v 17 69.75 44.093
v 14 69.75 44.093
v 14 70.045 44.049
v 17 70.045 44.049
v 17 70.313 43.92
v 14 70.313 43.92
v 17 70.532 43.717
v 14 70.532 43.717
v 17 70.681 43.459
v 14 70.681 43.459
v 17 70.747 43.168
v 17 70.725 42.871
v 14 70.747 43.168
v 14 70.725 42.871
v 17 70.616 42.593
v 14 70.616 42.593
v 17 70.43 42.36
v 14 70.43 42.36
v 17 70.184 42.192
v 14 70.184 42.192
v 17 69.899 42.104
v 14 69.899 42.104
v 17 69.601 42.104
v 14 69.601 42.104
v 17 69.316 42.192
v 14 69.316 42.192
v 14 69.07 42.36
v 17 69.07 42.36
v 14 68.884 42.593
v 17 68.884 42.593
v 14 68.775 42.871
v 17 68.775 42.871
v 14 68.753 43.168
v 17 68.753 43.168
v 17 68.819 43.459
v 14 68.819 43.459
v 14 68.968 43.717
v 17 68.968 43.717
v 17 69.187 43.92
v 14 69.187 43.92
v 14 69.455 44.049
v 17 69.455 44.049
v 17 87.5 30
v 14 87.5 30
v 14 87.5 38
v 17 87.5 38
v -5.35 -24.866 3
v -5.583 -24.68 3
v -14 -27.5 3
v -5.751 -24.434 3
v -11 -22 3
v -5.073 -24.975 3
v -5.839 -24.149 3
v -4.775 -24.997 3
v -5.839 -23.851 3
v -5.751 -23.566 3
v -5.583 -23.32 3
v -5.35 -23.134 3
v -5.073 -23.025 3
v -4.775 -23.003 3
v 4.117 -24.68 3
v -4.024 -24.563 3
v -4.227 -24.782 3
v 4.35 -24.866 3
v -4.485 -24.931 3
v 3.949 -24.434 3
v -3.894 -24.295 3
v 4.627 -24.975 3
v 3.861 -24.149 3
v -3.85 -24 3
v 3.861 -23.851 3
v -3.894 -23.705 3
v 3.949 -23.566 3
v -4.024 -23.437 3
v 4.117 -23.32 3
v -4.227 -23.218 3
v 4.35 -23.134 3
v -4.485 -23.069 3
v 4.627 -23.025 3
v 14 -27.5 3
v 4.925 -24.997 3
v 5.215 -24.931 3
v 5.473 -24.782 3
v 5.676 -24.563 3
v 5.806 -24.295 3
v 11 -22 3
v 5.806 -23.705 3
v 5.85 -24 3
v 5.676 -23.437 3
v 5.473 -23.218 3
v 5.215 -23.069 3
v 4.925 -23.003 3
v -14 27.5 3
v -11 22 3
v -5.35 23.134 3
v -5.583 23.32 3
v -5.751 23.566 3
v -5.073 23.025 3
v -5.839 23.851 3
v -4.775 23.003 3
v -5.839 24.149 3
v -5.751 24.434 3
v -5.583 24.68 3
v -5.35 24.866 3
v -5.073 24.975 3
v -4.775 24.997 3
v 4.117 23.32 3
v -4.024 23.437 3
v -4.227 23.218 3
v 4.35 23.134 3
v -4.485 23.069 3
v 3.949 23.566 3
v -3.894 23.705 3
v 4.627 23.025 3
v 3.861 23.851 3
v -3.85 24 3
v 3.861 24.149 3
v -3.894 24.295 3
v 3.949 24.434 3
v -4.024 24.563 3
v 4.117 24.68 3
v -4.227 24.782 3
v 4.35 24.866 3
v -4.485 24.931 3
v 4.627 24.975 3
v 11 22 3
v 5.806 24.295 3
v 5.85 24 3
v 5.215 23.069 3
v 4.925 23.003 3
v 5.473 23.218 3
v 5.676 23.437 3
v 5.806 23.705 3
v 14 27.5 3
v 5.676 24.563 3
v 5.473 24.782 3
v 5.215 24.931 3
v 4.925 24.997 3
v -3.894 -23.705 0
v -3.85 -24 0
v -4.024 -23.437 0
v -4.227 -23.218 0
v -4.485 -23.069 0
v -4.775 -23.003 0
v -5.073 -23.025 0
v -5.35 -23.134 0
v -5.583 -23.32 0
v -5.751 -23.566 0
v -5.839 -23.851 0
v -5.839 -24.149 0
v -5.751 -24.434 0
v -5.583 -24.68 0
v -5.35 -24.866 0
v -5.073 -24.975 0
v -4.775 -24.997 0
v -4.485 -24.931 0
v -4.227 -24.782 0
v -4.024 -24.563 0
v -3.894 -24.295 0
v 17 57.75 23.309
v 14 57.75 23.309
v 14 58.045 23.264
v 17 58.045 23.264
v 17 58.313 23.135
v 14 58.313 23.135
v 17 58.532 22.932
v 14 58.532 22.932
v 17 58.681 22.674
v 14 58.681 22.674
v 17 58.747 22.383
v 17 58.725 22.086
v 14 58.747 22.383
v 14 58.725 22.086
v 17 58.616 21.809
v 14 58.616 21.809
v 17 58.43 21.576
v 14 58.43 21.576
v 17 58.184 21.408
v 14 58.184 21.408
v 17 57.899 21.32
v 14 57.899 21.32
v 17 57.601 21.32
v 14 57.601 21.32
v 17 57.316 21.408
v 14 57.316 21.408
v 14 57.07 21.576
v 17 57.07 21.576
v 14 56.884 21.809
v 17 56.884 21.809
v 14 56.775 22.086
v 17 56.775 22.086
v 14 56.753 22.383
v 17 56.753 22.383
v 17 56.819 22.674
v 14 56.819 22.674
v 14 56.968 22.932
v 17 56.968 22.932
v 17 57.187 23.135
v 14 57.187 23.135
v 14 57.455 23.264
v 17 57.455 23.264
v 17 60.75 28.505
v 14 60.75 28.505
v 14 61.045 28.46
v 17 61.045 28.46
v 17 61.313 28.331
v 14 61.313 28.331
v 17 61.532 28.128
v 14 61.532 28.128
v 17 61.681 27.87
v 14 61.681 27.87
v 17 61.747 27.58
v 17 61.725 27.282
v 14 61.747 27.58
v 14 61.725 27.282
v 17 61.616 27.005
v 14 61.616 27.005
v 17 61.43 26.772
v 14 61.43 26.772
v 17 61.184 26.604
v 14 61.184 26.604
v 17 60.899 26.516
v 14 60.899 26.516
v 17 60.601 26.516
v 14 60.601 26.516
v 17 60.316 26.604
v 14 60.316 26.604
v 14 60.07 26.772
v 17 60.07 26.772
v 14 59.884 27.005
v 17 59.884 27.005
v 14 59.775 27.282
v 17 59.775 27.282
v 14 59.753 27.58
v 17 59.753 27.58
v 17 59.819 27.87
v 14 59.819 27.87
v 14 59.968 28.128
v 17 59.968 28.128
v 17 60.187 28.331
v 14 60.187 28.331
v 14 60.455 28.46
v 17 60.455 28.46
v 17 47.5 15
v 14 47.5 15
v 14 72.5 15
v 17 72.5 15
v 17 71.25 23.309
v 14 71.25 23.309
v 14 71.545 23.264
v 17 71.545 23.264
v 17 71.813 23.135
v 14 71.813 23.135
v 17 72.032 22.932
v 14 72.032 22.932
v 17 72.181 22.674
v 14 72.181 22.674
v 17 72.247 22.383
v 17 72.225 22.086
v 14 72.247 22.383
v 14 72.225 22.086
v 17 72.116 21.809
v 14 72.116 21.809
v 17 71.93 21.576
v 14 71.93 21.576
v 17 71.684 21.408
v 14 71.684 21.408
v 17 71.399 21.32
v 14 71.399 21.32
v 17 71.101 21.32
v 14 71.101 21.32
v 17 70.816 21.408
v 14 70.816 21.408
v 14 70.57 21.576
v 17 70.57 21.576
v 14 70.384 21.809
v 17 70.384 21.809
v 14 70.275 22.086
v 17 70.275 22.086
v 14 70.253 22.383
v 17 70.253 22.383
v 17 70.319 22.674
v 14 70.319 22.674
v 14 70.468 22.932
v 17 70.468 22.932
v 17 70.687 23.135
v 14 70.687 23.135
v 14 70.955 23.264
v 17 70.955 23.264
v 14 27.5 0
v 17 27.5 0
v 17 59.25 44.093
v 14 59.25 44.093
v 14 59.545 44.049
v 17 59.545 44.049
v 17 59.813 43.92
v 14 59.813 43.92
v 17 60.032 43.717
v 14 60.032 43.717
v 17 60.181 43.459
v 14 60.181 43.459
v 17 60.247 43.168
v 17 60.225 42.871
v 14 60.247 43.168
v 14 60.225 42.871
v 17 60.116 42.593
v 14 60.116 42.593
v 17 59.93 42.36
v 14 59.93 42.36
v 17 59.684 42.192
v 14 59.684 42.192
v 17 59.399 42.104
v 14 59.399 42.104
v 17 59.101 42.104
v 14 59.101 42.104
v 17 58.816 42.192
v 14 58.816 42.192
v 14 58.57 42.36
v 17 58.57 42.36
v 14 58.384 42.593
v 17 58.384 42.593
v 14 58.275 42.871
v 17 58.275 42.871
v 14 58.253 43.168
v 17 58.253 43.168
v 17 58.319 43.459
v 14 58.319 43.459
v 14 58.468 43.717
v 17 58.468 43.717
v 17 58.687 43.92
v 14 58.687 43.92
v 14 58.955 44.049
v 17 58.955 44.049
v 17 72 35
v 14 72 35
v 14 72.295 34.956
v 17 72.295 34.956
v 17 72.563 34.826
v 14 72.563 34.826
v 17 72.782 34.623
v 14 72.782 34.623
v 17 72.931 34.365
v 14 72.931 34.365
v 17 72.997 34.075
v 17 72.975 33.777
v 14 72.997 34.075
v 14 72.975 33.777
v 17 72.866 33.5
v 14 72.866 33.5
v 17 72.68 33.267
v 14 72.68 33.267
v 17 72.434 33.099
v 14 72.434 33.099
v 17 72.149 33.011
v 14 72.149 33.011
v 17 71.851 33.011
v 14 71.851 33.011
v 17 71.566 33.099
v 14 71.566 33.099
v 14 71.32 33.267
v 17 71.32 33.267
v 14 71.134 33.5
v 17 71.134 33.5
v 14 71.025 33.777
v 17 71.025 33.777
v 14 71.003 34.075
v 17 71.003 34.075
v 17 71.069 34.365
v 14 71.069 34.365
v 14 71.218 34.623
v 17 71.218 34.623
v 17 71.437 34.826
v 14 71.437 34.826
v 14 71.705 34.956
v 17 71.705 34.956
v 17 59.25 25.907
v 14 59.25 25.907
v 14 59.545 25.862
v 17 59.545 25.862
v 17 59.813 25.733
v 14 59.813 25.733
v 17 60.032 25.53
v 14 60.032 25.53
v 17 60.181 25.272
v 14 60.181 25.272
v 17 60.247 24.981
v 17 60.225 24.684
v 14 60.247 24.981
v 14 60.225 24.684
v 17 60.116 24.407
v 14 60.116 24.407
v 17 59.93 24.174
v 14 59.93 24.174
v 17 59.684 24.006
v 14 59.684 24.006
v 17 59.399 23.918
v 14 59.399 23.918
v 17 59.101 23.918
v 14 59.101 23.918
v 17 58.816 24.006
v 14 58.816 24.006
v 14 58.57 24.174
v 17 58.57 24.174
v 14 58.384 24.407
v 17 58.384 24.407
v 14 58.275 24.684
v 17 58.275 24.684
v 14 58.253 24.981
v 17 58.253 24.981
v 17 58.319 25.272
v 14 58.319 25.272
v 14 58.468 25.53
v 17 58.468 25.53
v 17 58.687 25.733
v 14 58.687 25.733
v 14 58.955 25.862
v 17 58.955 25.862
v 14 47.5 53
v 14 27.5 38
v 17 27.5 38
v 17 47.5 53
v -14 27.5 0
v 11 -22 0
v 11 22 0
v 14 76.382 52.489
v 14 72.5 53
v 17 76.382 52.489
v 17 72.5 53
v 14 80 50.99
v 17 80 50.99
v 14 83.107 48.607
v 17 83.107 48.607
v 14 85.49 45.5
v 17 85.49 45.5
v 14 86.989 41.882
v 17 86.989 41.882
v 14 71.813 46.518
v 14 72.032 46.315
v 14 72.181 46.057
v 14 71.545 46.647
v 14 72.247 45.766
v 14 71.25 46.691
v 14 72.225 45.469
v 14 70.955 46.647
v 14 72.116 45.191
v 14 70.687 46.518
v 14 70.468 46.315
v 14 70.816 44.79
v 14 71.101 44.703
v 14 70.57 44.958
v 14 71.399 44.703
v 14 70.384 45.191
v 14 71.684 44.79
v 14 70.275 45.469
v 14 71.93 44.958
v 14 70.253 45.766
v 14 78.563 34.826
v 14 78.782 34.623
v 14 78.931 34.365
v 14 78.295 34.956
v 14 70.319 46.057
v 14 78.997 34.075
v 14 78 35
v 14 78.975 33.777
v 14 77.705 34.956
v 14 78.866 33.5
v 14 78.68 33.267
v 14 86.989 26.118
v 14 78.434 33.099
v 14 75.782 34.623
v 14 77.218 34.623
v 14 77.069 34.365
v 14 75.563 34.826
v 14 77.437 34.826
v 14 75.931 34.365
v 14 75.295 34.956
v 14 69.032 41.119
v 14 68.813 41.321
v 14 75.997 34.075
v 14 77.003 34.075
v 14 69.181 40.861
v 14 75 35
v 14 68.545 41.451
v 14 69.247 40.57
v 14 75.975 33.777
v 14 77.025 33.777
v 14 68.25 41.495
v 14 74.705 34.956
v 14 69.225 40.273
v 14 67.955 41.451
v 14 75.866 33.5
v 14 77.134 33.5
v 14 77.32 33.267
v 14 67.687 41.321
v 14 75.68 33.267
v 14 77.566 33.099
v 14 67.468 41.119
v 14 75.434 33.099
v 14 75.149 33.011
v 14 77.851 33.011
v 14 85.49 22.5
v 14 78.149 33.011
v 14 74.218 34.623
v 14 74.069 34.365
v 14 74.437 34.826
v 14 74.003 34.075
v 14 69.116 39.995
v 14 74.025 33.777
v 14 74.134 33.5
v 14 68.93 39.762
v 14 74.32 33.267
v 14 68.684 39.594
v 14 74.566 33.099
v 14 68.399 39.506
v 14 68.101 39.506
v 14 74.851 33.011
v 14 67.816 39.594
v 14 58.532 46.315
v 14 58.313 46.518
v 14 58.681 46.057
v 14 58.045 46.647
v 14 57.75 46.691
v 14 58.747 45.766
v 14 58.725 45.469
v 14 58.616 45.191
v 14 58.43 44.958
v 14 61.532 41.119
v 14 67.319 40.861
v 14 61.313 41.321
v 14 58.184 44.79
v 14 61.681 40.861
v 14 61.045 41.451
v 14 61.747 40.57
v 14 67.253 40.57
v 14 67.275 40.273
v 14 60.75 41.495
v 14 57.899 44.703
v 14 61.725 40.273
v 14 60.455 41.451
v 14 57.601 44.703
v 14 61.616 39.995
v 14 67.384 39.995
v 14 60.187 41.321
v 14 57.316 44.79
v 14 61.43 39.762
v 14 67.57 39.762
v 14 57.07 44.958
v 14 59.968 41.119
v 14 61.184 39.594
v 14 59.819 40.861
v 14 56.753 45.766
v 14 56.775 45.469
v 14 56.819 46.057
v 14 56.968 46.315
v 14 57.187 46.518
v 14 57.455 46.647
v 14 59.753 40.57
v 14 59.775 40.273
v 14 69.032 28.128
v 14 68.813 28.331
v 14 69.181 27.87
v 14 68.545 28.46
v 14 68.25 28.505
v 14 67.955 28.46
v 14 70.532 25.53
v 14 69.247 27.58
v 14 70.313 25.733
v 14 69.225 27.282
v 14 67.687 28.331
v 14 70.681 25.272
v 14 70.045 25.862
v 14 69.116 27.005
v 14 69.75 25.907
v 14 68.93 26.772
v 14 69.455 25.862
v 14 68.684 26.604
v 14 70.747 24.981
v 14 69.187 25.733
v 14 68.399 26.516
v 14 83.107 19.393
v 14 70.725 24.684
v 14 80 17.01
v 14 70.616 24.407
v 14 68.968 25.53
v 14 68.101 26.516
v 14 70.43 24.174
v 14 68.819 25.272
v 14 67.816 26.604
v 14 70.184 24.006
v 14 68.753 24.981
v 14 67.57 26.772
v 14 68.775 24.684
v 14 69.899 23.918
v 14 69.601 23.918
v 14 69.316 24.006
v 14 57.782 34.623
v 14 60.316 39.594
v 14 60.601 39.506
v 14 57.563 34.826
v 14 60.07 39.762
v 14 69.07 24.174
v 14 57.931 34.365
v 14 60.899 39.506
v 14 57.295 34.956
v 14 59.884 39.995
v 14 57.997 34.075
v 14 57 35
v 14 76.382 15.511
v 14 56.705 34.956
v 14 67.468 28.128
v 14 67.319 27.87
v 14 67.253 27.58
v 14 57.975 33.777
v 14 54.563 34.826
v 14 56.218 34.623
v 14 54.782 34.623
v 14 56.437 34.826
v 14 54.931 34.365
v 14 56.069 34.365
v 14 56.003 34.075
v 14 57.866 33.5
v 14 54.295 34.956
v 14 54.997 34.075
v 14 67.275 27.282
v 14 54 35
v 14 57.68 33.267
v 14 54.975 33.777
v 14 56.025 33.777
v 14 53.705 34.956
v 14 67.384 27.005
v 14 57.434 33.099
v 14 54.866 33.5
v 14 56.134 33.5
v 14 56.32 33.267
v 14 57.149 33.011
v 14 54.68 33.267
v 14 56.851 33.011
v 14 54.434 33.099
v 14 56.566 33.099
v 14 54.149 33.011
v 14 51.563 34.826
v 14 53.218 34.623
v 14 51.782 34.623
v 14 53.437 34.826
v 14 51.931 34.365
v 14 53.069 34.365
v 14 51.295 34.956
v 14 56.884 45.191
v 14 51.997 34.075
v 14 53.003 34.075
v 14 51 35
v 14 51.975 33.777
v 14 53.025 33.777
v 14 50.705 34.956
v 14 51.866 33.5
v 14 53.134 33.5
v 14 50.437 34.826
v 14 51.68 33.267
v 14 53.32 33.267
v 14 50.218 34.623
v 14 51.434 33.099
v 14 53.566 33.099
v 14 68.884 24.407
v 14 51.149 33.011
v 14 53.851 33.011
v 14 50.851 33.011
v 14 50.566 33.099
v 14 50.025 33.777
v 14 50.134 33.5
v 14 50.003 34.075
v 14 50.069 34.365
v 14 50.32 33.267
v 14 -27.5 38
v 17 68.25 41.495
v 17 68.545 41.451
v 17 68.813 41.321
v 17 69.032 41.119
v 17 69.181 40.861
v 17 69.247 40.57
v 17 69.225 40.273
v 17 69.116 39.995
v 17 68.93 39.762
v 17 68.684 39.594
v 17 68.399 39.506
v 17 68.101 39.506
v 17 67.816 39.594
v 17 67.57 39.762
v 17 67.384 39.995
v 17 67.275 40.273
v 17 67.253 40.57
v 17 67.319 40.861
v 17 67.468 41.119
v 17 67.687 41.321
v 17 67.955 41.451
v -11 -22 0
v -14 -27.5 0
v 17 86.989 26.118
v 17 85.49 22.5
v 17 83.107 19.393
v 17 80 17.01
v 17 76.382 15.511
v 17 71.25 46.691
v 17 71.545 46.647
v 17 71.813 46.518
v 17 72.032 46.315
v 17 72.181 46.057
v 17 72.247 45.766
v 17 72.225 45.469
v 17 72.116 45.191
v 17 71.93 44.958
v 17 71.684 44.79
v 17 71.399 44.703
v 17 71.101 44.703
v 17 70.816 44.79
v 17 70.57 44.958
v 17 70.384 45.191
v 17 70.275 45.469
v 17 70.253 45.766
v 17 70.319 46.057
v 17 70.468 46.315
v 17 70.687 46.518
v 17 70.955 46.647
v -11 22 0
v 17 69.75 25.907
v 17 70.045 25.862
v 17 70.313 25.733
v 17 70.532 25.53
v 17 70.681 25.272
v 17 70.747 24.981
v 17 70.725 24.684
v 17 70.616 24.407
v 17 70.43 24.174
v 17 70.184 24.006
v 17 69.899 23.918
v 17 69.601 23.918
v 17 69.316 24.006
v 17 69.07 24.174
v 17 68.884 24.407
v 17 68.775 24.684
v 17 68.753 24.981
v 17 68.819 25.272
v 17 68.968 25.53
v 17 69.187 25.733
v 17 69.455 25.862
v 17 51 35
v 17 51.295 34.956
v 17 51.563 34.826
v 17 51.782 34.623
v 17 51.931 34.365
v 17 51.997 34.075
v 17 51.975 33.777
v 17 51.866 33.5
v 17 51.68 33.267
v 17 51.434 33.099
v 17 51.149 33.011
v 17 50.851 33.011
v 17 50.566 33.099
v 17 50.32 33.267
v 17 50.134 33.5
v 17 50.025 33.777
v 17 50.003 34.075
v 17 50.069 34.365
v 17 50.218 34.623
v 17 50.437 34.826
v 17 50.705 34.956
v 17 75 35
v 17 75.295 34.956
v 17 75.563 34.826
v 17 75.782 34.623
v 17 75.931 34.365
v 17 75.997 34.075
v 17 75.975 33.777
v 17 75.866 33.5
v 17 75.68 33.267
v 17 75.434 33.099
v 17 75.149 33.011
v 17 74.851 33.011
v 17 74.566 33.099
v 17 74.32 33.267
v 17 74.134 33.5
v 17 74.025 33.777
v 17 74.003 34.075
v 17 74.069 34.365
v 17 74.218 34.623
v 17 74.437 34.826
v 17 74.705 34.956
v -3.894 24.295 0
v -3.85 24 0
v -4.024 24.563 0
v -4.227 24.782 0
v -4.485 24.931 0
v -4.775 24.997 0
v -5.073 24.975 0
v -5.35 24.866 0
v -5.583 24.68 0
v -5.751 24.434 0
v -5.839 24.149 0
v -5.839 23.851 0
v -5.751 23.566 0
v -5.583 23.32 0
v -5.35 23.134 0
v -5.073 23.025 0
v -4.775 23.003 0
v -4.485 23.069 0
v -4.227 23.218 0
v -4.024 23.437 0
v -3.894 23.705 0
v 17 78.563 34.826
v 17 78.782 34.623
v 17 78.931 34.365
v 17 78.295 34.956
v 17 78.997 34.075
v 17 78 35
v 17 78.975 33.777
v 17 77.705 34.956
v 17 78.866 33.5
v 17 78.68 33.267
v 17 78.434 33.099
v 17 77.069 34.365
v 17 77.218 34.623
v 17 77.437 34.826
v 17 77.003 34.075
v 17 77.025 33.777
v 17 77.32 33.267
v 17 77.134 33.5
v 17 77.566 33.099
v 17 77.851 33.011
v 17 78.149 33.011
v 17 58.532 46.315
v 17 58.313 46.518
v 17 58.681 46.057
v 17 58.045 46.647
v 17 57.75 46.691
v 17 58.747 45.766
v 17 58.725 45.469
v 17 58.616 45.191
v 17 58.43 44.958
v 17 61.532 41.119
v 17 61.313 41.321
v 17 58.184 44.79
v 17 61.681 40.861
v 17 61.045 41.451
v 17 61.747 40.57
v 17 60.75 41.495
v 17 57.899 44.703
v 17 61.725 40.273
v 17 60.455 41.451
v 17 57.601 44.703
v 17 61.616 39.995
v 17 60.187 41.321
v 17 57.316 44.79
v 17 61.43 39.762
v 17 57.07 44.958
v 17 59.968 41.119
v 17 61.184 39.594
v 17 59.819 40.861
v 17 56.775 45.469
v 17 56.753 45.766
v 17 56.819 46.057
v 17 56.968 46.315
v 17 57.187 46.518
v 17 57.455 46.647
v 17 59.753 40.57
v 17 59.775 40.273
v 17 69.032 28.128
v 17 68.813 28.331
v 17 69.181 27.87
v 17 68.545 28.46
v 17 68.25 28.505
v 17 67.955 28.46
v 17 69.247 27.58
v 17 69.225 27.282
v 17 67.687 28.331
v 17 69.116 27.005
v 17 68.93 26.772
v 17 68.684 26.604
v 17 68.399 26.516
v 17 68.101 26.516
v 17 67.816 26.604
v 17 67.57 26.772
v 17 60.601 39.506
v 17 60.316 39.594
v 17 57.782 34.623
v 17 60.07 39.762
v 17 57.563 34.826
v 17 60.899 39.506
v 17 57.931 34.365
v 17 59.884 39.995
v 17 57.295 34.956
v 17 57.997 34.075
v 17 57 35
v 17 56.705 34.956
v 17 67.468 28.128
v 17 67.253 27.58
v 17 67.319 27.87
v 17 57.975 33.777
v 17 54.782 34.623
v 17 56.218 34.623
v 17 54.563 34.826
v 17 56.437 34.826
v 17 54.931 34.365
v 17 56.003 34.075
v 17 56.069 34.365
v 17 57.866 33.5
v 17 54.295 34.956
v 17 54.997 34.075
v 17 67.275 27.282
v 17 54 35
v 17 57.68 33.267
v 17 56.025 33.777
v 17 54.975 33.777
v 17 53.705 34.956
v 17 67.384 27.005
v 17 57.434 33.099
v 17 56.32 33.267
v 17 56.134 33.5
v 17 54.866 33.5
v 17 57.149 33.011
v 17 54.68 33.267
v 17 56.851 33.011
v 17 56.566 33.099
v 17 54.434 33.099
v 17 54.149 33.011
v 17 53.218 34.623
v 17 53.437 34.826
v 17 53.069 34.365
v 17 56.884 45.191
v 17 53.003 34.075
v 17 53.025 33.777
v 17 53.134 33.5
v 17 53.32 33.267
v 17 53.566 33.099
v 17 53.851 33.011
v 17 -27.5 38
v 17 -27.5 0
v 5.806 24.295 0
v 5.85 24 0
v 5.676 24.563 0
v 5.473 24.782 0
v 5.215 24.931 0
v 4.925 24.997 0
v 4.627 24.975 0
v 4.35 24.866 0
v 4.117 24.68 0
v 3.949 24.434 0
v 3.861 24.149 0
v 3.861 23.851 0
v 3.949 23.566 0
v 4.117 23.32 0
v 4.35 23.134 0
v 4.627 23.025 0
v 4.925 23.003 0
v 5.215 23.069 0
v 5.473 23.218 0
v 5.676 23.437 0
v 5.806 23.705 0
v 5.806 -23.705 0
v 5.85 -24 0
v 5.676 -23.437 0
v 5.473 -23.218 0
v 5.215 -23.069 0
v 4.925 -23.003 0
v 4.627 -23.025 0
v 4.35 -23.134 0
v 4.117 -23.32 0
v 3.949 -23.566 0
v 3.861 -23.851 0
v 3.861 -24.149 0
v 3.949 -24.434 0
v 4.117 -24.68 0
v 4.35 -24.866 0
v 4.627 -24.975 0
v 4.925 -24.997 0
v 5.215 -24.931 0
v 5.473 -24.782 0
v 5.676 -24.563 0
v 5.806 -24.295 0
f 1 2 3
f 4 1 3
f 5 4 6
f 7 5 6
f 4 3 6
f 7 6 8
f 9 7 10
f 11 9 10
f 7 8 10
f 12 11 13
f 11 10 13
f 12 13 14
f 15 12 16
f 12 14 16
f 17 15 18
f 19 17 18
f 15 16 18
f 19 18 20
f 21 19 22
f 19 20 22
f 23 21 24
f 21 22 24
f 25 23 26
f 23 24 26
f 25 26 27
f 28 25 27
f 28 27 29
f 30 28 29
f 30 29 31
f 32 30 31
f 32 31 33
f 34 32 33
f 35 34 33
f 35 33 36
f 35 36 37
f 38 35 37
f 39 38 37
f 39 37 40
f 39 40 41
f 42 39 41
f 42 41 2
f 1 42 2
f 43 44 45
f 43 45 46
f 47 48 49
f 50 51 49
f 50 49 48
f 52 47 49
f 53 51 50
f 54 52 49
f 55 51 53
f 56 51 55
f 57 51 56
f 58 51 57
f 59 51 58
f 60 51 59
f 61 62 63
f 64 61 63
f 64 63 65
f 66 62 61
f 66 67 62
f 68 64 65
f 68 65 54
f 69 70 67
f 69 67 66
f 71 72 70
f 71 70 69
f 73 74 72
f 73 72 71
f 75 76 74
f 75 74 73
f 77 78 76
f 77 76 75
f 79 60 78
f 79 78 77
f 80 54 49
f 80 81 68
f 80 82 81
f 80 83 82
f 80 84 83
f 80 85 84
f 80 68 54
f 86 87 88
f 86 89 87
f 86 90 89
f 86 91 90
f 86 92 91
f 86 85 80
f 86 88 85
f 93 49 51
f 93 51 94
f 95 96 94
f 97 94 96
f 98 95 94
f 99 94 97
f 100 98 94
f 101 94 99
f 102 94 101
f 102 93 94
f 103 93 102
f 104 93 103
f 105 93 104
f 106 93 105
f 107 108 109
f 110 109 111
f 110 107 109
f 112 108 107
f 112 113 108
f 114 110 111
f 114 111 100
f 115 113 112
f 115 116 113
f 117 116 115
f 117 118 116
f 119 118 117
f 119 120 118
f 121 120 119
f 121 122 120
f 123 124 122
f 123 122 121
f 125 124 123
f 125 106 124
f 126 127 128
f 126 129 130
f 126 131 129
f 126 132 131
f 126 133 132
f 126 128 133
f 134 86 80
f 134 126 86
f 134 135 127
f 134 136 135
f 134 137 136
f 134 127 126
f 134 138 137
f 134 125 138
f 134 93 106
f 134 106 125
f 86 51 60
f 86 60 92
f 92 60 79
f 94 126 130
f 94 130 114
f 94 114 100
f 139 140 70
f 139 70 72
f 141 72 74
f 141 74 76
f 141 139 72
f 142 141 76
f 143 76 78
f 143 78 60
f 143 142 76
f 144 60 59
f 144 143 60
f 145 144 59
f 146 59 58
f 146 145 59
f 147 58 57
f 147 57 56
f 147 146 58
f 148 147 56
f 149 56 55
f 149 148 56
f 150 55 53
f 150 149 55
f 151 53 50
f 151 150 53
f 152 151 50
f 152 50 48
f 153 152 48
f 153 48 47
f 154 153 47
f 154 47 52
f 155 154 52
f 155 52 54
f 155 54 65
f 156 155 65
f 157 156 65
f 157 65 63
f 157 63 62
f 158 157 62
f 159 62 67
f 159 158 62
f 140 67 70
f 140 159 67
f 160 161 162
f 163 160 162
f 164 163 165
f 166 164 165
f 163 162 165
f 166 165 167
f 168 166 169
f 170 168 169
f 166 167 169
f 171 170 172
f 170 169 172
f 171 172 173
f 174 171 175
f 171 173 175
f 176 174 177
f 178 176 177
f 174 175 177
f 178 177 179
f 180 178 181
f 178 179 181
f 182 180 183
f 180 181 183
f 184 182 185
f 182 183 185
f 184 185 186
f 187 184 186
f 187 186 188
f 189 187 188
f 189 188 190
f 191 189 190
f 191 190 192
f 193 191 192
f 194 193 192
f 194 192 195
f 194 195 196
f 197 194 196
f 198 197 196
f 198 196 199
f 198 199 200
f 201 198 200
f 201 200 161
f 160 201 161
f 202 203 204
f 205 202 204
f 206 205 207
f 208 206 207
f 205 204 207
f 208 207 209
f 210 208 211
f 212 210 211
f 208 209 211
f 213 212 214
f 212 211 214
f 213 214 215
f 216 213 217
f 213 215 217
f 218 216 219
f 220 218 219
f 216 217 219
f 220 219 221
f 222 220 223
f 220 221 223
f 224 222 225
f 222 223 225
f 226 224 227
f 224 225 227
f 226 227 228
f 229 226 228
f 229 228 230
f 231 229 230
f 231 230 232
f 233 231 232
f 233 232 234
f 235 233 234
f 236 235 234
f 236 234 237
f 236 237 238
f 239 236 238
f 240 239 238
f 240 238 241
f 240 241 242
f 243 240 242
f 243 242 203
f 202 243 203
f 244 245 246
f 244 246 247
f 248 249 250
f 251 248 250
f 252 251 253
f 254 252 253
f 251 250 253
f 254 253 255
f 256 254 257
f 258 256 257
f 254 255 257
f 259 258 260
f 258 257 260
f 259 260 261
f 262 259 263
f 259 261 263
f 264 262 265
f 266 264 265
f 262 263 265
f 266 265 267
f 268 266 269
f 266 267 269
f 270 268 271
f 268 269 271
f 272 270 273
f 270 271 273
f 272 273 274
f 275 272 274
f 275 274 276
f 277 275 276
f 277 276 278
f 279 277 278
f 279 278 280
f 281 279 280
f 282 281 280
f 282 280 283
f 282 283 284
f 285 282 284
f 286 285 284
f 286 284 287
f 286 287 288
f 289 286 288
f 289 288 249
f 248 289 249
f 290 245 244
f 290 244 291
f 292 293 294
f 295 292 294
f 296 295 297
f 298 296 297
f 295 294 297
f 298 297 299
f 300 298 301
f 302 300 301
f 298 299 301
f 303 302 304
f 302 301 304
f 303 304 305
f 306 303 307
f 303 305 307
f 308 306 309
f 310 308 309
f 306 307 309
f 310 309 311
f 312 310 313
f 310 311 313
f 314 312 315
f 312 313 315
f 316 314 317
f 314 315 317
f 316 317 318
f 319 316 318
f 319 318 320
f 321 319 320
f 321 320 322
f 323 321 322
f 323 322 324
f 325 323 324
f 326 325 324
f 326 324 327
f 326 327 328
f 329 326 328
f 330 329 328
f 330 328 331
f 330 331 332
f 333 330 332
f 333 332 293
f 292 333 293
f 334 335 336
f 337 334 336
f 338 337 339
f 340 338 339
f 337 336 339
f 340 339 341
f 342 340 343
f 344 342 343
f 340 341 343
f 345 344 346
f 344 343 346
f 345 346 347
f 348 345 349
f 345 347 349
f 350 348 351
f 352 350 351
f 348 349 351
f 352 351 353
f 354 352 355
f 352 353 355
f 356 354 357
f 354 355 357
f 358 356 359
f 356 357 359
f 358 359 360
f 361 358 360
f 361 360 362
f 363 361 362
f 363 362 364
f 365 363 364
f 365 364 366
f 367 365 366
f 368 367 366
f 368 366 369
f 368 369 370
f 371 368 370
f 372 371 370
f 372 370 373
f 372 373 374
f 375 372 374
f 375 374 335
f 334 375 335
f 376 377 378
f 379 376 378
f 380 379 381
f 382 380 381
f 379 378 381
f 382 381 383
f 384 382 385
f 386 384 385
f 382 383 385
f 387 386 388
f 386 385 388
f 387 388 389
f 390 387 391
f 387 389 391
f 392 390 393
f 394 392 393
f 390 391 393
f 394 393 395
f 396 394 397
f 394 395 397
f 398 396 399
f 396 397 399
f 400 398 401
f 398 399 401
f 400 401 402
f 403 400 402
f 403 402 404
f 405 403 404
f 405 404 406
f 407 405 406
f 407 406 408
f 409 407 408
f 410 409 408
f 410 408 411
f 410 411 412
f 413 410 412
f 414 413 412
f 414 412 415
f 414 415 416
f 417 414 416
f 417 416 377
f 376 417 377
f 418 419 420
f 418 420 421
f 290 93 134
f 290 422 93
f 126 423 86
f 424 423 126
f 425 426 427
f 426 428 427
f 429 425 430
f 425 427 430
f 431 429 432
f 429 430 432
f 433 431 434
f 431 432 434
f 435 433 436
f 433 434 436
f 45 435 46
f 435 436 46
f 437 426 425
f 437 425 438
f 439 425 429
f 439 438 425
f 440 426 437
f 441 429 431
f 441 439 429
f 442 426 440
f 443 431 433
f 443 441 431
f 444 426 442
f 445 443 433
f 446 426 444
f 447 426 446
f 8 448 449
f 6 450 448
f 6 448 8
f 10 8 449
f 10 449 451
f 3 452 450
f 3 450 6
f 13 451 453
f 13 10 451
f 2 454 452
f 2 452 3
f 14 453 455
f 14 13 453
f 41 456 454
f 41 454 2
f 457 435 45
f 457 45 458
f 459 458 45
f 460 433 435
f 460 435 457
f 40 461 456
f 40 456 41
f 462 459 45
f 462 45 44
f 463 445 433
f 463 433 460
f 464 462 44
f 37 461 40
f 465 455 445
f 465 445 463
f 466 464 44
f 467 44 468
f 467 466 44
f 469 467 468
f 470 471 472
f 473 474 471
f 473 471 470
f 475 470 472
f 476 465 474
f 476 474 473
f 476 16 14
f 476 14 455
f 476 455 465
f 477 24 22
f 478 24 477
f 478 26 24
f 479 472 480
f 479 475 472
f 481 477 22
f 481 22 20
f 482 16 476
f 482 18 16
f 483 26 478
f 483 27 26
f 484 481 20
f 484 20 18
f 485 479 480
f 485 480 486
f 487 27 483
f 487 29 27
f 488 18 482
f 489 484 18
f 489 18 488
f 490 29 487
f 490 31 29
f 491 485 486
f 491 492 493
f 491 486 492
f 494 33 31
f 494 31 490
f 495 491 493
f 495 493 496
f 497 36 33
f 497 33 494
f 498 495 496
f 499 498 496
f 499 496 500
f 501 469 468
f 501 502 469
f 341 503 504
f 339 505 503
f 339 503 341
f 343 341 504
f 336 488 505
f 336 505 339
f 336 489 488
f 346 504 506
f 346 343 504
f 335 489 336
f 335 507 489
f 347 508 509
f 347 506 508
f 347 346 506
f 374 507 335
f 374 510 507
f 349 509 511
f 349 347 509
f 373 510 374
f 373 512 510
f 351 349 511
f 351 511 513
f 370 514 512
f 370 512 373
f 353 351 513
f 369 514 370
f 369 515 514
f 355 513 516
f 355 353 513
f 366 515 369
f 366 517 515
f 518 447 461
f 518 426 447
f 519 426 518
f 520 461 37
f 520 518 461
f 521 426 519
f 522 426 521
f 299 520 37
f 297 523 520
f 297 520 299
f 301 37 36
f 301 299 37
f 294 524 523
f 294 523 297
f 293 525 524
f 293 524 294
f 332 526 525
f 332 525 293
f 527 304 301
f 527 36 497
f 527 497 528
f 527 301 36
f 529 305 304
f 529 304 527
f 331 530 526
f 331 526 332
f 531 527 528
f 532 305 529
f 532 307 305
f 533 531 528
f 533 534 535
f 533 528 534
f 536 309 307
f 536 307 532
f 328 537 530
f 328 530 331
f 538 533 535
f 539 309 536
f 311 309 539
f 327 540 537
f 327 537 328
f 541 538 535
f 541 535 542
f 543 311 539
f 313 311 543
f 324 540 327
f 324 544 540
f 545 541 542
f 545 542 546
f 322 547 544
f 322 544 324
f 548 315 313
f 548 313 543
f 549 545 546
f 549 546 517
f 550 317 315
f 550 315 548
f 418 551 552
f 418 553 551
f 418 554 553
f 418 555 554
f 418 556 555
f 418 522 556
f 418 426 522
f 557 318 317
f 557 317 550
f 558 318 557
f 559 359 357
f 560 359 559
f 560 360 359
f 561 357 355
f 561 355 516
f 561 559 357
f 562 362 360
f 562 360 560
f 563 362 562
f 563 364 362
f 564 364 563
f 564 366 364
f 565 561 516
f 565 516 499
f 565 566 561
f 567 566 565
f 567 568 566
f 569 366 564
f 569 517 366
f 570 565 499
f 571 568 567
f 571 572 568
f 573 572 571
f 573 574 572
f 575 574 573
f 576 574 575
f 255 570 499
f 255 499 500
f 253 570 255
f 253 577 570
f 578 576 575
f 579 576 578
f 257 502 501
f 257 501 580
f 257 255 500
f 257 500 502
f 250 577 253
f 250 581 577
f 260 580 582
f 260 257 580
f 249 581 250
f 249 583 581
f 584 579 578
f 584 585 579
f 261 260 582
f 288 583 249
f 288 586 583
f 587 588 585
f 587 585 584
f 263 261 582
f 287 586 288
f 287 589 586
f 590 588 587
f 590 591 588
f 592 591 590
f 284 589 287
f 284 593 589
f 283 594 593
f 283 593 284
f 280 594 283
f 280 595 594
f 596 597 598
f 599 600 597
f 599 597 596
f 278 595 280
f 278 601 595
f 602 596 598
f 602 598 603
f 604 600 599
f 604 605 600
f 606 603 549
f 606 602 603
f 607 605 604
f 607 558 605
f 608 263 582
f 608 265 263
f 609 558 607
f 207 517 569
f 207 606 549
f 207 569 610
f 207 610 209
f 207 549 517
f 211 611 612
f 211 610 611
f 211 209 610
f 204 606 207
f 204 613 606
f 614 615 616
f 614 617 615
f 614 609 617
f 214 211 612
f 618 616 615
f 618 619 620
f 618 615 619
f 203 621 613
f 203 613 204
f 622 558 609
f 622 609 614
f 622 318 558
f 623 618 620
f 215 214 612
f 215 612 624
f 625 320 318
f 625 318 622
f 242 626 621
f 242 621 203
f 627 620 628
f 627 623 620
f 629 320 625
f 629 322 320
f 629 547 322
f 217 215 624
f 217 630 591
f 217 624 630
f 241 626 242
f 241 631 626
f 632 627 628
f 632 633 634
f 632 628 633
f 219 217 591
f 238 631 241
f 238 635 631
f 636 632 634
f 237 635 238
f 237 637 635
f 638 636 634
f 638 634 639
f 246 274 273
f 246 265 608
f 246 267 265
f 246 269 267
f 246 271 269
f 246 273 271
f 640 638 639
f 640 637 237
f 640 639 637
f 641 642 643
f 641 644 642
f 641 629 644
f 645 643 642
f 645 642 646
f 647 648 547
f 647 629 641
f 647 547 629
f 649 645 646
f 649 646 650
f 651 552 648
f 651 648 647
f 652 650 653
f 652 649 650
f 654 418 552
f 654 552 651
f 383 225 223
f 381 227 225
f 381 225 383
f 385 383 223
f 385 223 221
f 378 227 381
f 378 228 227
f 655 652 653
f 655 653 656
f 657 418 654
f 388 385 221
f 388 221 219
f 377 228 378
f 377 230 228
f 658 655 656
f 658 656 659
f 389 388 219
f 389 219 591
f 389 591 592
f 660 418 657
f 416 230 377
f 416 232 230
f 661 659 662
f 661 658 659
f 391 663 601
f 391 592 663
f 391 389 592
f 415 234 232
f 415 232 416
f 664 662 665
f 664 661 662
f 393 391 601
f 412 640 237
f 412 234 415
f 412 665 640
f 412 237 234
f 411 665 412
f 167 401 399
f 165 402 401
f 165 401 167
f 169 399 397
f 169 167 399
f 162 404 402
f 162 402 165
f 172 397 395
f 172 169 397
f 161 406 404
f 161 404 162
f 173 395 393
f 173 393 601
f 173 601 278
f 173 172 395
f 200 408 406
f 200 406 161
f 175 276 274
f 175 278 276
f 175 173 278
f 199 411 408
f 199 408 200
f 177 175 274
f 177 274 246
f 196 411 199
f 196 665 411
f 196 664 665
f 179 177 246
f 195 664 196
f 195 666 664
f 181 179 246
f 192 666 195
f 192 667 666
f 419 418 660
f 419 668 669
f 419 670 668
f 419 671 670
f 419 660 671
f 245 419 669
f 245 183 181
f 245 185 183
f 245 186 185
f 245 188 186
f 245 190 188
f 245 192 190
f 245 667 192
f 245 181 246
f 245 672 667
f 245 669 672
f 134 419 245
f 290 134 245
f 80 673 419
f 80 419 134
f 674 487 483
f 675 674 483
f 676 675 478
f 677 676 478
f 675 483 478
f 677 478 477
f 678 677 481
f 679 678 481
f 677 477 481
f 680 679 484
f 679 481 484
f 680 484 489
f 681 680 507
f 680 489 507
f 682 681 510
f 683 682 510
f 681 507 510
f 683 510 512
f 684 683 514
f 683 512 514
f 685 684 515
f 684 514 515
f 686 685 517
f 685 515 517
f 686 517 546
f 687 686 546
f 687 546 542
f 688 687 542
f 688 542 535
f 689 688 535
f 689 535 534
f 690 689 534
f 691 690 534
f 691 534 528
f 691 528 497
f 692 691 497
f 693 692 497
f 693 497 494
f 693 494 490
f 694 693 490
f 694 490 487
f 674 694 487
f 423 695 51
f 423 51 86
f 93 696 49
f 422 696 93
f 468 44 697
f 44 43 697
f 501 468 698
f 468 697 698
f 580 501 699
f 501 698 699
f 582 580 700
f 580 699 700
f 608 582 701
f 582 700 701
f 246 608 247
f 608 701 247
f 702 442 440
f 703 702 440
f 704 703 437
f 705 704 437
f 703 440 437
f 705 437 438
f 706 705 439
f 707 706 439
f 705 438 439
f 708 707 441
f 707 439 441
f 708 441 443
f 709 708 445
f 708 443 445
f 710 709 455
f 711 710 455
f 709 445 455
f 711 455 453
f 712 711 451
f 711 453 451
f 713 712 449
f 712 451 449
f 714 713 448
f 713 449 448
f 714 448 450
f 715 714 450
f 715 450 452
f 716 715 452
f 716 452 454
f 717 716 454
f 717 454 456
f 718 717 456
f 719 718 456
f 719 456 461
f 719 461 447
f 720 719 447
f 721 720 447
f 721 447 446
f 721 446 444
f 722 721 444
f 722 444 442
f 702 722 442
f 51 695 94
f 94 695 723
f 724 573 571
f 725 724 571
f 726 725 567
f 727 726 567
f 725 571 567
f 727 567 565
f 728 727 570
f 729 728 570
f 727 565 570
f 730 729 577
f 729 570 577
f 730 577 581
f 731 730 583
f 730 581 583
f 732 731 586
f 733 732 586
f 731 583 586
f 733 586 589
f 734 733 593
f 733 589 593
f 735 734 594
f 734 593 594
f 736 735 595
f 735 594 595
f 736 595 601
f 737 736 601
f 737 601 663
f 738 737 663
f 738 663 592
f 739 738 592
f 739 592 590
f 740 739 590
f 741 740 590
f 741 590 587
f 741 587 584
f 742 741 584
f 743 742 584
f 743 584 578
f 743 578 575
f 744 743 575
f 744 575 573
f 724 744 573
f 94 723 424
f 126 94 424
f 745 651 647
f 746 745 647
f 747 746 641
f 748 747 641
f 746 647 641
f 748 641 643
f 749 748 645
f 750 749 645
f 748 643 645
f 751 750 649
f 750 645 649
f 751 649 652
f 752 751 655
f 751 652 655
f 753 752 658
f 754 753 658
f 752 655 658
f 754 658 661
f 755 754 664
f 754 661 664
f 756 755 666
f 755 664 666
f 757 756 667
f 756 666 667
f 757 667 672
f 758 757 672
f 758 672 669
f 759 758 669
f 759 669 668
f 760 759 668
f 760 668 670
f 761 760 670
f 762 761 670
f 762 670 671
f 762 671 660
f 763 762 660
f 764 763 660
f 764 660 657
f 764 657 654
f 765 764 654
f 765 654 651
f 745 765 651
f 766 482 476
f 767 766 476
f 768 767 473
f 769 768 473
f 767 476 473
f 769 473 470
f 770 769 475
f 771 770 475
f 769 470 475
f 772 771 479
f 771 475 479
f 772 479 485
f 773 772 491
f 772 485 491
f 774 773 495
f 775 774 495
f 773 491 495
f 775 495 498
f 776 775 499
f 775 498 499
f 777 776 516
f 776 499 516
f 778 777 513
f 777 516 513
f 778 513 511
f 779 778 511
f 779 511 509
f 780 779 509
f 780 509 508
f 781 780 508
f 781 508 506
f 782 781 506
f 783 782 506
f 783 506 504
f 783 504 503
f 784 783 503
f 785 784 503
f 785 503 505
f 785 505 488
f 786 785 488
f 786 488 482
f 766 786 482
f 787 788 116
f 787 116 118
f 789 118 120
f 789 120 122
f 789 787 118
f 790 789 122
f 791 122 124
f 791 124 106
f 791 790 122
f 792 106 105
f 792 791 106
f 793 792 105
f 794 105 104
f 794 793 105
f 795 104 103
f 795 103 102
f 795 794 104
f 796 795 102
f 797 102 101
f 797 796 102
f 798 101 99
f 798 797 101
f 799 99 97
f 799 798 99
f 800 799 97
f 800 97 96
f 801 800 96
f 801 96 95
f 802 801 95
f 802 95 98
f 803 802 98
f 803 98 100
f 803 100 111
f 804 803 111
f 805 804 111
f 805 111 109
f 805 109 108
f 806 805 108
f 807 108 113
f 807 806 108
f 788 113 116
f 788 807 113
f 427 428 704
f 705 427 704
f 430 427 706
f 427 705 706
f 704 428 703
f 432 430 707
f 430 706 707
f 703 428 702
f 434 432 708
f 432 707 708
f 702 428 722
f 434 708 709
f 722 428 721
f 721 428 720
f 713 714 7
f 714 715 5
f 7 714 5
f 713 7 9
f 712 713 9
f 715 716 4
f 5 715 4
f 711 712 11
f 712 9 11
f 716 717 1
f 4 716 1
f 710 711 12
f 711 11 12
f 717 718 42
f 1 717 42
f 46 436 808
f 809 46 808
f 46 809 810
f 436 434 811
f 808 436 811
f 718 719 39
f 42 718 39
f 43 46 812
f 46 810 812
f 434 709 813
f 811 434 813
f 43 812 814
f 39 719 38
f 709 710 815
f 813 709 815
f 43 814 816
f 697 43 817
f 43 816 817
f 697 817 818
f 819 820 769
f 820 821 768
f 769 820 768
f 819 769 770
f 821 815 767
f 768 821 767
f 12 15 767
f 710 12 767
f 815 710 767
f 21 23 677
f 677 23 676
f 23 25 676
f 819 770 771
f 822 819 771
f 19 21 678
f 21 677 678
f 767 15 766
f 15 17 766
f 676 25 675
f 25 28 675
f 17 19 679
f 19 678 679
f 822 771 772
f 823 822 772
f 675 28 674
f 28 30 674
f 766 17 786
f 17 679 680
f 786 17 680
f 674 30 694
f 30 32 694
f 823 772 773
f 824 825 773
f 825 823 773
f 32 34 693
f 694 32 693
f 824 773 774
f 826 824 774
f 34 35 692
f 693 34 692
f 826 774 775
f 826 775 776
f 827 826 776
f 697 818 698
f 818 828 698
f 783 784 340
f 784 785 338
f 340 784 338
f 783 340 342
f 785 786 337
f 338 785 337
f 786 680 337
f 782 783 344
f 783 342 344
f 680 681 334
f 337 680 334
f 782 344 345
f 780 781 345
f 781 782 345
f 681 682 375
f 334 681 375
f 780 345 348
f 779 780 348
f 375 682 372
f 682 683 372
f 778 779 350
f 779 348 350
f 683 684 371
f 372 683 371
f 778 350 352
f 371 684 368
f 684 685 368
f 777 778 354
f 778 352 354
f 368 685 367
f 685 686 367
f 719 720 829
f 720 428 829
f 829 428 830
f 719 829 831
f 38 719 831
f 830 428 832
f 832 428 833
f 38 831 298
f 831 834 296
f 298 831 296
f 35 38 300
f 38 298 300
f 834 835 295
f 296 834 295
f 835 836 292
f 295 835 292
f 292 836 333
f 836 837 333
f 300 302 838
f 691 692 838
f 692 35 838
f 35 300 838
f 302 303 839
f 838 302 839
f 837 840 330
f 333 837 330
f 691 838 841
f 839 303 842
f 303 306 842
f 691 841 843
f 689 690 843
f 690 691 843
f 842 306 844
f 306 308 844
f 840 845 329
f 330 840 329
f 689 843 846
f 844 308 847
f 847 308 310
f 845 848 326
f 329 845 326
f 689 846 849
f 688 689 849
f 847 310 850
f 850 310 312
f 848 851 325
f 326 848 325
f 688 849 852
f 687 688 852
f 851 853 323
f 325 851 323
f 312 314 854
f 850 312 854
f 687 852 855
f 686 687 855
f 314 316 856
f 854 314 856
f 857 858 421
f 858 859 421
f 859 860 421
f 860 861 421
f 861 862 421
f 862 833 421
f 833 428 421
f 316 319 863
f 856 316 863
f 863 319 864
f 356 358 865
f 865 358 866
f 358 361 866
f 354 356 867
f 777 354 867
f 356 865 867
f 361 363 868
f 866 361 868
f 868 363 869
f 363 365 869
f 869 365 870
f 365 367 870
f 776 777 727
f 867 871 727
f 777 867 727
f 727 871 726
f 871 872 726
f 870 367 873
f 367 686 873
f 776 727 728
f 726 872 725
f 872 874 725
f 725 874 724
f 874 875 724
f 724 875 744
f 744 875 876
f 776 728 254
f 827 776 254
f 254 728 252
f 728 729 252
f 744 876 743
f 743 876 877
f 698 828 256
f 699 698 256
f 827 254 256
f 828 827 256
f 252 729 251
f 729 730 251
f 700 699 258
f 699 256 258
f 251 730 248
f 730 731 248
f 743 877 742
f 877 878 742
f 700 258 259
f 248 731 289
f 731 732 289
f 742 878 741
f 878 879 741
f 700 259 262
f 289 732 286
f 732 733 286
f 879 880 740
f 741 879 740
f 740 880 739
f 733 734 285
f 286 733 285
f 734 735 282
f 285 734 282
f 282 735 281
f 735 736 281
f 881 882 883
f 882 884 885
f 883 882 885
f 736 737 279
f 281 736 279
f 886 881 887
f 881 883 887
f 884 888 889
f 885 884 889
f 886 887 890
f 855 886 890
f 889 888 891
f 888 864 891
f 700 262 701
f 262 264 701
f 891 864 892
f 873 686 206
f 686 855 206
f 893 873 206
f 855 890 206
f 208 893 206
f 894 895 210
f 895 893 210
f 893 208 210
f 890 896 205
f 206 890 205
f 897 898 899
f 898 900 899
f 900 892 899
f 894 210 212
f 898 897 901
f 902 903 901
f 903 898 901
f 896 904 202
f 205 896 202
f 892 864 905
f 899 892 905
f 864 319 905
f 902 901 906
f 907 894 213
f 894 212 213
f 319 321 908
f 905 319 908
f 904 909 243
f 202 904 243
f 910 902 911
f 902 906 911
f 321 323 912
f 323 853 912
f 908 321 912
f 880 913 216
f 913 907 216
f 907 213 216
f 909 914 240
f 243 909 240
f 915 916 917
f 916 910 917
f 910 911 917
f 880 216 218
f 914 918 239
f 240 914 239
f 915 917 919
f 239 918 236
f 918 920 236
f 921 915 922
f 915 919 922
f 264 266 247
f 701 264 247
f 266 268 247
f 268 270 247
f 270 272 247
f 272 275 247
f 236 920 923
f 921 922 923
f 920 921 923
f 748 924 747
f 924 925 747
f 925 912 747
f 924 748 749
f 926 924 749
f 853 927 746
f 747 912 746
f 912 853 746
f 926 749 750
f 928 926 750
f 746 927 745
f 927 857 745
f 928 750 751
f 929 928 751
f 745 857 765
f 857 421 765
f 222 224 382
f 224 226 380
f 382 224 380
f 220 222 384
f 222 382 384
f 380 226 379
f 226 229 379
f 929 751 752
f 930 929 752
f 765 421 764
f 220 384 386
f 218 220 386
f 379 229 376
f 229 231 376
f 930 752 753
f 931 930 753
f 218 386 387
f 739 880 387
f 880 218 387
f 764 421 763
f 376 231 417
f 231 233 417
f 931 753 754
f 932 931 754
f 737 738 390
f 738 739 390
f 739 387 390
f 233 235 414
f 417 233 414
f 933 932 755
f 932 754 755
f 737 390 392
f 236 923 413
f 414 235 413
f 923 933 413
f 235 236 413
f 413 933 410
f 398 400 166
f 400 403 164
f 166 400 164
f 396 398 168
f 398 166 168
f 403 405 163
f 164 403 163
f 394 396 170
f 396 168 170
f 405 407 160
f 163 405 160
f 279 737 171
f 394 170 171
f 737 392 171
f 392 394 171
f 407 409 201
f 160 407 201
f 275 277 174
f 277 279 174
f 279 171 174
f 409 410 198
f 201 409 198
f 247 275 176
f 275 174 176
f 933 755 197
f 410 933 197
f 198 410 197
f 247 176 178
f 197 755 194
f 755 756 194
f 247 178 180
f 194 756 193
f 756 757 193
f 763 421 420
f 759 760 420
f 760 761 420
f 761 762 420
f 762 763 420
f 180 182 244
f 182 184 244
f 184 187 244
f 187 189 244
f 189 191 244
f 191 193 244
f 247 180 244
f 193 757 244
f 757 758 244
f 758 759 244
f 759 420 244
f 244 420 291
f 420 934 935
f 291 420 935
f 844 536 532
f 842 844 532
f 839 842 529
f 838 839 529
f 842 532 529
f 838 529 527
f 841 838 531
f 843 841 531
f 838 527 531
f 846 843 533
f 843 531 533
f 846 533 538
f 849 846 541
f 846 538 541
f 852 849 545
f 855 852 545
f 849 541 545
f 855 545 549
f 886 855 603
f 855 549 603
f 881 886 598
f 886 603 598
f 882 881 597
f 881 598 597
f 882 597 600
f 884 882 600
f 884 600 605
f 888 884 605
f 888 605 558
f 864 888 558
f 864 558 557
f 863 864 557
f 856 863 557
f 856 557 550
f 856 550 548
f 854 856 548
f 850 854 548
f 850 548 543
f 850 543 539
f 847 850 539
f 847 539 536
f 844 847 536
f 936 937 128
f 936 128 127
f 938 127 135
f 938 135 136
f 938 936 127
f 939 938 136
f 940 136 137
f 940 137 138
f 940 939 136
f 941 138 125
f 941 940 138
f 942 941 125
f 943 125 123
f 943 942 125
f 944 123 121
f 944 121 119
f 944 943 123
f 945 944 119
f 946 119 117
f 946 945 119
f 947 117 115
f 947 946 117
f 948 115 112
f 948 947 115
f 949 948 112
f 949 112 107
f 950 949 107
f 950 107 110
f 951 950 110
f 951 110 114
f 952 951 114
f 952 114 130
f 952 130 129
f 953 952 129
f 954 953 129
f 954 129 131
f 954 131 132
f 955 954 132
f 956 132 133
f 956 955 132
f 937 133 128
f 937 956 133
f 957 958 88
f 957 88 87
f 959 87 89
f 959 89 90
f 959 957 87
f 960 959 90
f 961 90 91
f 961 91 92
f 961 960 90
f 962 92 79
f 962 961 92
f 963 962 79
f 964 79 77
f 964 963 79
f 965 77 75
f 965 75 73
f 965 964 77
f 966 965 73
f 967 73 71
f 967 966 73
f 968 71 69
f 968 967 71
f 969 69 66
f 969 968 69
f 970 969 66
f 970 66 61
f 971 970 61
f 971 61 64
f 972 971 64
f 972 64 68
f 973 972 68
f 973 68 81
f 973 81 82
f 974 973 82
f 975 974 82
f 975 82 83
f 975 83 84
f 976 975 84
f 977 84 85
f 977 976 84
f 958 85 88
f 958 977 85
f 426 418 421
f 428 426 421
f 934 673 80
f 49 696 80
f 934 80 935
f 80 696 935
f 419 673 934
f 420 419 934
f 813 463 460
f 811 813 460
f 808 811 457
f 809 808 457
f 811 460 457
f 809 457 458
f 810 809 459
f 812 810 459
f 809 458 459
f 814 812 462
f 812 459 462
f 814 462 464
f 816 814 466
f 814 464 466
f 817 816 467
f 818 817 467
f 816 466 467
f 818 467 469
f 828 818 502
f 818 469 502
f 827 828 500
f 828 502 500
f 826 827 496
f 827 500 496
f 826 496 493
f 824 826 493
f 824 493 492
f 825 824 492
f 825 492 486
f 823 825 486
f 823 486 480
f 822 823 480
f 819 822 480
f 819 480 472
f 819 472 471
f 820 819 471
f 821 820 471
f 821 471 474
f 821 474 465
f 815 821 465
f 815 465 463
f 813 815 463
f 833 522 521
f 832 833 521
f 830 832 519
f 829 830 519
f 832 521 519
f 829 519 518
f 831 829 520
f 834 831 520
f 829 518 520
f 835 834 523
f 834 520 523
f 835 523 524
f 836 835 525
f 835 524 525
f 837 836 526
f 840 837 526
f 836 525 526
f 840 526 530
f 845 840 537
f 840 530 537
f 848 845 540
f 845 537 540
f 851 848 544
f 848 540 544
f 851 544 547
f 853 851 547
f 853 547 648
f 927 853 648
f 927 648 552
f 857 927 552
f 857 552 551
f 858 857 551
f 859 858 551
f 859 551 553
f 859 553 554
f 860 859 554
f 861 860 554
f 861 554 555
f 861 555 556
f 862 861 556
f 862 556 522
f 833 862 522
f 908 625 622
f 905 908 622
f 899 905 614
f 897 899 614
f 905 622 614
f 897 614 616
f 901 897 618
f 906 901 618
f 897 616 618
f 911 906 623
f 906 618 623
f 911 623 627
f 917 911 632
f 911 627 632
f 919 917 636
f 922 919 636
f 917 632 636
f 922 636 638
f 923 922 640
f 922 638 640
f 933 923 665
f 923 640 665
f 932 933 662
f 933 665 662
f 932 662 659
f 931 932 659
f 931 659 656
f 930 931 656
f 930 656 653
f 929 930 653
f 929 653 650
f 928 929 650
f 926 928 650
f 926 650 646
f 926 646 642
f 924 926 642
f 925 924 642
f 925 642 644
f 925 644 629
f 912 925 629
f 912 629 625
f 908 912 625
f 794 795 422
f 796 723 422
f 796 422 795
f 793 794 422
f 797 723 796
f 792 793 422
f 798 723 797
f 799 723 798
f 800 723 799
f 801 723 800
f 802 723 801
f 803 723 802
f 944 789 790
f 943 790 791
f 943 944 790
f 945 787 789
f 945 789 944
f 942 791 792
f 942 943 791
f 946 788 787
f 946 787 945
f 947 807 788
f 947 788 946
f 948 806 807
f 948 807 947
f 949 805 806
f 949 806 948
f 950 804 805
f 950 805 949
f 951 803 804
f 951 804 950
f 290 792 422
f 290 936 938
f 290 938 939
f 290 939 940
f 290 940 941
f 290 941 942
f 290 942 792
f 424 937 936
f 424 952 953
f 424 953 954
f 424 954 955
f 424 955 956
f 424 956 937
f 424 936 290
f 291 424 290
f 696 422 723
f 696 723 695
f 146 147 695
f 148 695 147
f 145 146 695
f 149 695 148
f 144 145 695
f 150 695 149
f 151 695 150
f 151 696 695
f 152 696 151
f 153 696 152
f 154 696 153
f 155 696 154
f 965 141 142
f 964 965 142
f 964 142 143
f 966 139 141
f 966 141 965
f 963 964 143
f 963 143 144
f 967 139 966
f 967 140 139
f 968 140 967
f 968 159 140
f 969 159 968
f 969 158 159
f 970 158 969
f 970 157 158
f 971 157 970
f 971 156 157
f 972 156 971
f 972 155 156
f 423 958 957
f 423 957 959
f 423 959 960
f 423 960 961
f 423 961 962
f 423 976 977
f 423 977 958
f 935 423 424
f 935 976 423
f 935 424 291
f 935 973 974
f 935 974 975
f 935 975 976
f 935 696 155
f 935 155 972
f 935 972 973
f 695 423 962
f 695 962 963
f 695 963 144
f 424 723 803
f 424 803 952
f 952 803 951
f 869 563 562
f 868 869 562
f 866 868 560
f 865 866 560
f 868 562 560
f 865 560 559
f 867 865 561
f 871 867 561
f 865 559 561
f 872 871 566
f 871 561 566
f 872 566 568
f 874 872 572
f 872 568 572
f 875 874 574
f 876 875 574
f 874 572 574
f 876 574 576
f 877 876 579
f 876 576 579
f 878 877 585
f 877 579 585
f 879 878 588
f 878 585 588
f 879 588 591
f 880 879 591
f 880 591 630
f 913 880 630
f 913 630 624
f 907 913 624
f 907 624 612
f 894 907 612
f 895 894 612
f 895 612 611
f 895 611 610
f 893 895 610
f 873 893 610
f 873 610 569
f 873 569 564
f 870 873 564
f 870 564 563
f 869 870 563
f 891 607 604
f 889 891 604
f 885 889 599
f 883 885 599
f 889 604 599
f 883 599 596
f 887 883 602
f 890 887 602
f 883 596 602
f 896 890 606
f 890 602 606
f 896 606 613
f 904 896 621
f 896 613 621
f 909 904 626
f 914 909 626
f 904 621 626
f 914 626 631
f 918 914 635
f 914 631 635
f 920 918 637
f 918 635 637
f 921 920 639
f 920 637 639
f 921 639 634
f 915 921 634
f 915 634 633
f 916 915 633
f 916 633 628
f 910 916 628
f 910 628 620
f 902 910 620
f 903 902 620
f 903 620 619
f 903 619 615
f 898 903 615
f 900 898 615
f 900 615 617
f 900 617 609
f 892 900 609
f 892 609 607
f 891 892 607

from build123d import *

# Parameters (mm, degrees)
SKETCH1_W           = 31
SKETCH1_H           = 55
SKETCH1_R           = 1
SKETCH1_W_2         = 22
SKETCH1_H_2         = 44
BOSS_EXTRUDE1_DEPTH = 3
SKETCH2_W           = 3
SKETCH2_H           = 55
BOSS_EXTRUDE2_DEPTH = 35
SKETCH3_W           = 3
SKETCH3_H           = 53
BOSS_EXTRUDE3_DEPTH = 20
CUT_EXTRUDE1_DEPTH  = 3
SKETCH5_W           = 3
SKETCH5_H           = 38
BOSS_EXTRUDE4_DEPTH = 40
SKETCH6_R           = 1
CUT_EXTRUDE2_DEPTH  = 31
FILLET1_R           = 15


with BuildPart() as part:
    # Sketch1 → Boss-Extrude1 (new body)
    with BuildSketch(Plane.XY):
        with Locations((1.5, 0)):
            Rectangle(SKETCH1_W, SKETCH1_H)
        with Locations((-4.85, -24)):
            Circle(SKETCH1_R, mode=Mode.SUBTRACT)
        with Locations((4.85, -24)):
            Circle(SKETCH1_R, mode=Mode.SUBTRACT)
        with Locations((4.85, 24)):
            Circle(SKETCH1_R, mode=Mode.SUBTRACT)
        with Locations((-4.85, 24)):
            Circle(SKETCH1_R, mode=Mode.SUBTRACT)
        Rectangle(SKETCH1_W_2, SKETCH1_H_2, mode=Mode.SUBTRACT)
    extrude(amount=BOSS_EXTRUDE1_DEPTH)

    # Sketch2 → Boss-Extrude2 (add)
    with BuildSketch(Plane.XY.offset(3)):
        with Locations((15.5, 0)):
            Rectangle(SKETCH2_W, SKETCH2_H)
    extrude(amount=BOSS_EXTRUDE2_DEPTH)

    # Sketch3 → Boss-Extrude3 (add)
    with BuildSketch(Plane(origin=(0, 27.5, 0), x_dir=(1, 0, 0), z_dir=(0, 1, 0))):
        with Locations((15.5, -26.5)):
            Rectangle(SKETCH3_W, SKETCH3_H)
    extrude(amount=BOSS_EXTRUDE3_DEPTH)

    # Sketch4 → Cut-Extrude1 (cut)
    with BuildSketch(Plane.ZY.offset(-14)):
        Polygon((53, 27.5), (38, 27.5), (53, 47.5), align=None)
        Polygon((0, 27.5), (0, 47.5), (15, 47.5), align=None)
    extrude(amount=-CUT_EXTRUDE1_DEPTH, mode=Mode.SUBTRACT)

    # Sketch5 → Boss-Extrude4 (add)
    with BuildSketch(Plane(origin=(0, 47.5, 0), x_dir=(1, 0, 0), z_dir=(0, 1, 0))):
        with Locations((15.5, -34)):
            Rectangle(SKETCH5_W, SKETCH5_H)
    extrude(amount=BOSS_EXTRUDE4_DEPTH)

    # Sketch6 → Cut-Extrude2 (cut)
    with BuildSketch(Plane.ZY.offset(14)):
        with Locations((34, 72)):
            Circle(SKETCH6_R)
        with Locations((34, 75)):
            Circle(SKETCH6_R)
        with Locations((34, 78)):
            Circle(SKETCH6_R)
        with Locations((45.691342951, 71.25)):
            Circle(SKETCH6_R)
        with Locations((43.09326674, 69.75)):
            Circle(SKETCH6_R)
        with Locations((40.495190528, 68.25)):
            Circle(SKETCH6_R)
        with Locations((45.691342951, 57.75)):
            Circle(SKETCH6_R)
        with Locations((43.09326674, 59.25)):
            Circle(SKETCH6_R)
        with Locations((40.495190528, 60.75)):
            Circle(SKETCH6_R)
        with Locations((34, 51)):
            Circle(SKETCH6_R)
        with Locations((34, 54)):
            Circle(SKETCH6_R)
        with Locations((34, 57)):
            Circle(SKETCH6_R)
        with Locations((22.308657049, 57.75)):
            Circle(SKETCH6_R)
        with Locations((24.90673326, 59.25)):
            Circle(SKETCH6_R)
        with Locations((27.504809472, 60.75)):
            Circle(SKETCH6_R)
        with Locations((22.308657049, 71.25)):
            Circle(SKETCH6_R)
        with Locations((24.90673326, 69.75)):
            Circle(SKETCH6_R)
        with Locations((27.504809472, 68.25)):
            Circle(SKETCH6_R)
    extrude(amount=-CUT_EXTRUDE2_DEPTH, mode=Mode.SUBTRACT)

    # Fillet1
    fillet1_edges = [part.edges().sort_by_distance(p)[0] for p in [
        (15.5, 87.5, 53),
        (15.5, 87.5, 15),
    ]]
    fillet(fillet1_edges, radius=FILLET1_R)


solid = part.part
